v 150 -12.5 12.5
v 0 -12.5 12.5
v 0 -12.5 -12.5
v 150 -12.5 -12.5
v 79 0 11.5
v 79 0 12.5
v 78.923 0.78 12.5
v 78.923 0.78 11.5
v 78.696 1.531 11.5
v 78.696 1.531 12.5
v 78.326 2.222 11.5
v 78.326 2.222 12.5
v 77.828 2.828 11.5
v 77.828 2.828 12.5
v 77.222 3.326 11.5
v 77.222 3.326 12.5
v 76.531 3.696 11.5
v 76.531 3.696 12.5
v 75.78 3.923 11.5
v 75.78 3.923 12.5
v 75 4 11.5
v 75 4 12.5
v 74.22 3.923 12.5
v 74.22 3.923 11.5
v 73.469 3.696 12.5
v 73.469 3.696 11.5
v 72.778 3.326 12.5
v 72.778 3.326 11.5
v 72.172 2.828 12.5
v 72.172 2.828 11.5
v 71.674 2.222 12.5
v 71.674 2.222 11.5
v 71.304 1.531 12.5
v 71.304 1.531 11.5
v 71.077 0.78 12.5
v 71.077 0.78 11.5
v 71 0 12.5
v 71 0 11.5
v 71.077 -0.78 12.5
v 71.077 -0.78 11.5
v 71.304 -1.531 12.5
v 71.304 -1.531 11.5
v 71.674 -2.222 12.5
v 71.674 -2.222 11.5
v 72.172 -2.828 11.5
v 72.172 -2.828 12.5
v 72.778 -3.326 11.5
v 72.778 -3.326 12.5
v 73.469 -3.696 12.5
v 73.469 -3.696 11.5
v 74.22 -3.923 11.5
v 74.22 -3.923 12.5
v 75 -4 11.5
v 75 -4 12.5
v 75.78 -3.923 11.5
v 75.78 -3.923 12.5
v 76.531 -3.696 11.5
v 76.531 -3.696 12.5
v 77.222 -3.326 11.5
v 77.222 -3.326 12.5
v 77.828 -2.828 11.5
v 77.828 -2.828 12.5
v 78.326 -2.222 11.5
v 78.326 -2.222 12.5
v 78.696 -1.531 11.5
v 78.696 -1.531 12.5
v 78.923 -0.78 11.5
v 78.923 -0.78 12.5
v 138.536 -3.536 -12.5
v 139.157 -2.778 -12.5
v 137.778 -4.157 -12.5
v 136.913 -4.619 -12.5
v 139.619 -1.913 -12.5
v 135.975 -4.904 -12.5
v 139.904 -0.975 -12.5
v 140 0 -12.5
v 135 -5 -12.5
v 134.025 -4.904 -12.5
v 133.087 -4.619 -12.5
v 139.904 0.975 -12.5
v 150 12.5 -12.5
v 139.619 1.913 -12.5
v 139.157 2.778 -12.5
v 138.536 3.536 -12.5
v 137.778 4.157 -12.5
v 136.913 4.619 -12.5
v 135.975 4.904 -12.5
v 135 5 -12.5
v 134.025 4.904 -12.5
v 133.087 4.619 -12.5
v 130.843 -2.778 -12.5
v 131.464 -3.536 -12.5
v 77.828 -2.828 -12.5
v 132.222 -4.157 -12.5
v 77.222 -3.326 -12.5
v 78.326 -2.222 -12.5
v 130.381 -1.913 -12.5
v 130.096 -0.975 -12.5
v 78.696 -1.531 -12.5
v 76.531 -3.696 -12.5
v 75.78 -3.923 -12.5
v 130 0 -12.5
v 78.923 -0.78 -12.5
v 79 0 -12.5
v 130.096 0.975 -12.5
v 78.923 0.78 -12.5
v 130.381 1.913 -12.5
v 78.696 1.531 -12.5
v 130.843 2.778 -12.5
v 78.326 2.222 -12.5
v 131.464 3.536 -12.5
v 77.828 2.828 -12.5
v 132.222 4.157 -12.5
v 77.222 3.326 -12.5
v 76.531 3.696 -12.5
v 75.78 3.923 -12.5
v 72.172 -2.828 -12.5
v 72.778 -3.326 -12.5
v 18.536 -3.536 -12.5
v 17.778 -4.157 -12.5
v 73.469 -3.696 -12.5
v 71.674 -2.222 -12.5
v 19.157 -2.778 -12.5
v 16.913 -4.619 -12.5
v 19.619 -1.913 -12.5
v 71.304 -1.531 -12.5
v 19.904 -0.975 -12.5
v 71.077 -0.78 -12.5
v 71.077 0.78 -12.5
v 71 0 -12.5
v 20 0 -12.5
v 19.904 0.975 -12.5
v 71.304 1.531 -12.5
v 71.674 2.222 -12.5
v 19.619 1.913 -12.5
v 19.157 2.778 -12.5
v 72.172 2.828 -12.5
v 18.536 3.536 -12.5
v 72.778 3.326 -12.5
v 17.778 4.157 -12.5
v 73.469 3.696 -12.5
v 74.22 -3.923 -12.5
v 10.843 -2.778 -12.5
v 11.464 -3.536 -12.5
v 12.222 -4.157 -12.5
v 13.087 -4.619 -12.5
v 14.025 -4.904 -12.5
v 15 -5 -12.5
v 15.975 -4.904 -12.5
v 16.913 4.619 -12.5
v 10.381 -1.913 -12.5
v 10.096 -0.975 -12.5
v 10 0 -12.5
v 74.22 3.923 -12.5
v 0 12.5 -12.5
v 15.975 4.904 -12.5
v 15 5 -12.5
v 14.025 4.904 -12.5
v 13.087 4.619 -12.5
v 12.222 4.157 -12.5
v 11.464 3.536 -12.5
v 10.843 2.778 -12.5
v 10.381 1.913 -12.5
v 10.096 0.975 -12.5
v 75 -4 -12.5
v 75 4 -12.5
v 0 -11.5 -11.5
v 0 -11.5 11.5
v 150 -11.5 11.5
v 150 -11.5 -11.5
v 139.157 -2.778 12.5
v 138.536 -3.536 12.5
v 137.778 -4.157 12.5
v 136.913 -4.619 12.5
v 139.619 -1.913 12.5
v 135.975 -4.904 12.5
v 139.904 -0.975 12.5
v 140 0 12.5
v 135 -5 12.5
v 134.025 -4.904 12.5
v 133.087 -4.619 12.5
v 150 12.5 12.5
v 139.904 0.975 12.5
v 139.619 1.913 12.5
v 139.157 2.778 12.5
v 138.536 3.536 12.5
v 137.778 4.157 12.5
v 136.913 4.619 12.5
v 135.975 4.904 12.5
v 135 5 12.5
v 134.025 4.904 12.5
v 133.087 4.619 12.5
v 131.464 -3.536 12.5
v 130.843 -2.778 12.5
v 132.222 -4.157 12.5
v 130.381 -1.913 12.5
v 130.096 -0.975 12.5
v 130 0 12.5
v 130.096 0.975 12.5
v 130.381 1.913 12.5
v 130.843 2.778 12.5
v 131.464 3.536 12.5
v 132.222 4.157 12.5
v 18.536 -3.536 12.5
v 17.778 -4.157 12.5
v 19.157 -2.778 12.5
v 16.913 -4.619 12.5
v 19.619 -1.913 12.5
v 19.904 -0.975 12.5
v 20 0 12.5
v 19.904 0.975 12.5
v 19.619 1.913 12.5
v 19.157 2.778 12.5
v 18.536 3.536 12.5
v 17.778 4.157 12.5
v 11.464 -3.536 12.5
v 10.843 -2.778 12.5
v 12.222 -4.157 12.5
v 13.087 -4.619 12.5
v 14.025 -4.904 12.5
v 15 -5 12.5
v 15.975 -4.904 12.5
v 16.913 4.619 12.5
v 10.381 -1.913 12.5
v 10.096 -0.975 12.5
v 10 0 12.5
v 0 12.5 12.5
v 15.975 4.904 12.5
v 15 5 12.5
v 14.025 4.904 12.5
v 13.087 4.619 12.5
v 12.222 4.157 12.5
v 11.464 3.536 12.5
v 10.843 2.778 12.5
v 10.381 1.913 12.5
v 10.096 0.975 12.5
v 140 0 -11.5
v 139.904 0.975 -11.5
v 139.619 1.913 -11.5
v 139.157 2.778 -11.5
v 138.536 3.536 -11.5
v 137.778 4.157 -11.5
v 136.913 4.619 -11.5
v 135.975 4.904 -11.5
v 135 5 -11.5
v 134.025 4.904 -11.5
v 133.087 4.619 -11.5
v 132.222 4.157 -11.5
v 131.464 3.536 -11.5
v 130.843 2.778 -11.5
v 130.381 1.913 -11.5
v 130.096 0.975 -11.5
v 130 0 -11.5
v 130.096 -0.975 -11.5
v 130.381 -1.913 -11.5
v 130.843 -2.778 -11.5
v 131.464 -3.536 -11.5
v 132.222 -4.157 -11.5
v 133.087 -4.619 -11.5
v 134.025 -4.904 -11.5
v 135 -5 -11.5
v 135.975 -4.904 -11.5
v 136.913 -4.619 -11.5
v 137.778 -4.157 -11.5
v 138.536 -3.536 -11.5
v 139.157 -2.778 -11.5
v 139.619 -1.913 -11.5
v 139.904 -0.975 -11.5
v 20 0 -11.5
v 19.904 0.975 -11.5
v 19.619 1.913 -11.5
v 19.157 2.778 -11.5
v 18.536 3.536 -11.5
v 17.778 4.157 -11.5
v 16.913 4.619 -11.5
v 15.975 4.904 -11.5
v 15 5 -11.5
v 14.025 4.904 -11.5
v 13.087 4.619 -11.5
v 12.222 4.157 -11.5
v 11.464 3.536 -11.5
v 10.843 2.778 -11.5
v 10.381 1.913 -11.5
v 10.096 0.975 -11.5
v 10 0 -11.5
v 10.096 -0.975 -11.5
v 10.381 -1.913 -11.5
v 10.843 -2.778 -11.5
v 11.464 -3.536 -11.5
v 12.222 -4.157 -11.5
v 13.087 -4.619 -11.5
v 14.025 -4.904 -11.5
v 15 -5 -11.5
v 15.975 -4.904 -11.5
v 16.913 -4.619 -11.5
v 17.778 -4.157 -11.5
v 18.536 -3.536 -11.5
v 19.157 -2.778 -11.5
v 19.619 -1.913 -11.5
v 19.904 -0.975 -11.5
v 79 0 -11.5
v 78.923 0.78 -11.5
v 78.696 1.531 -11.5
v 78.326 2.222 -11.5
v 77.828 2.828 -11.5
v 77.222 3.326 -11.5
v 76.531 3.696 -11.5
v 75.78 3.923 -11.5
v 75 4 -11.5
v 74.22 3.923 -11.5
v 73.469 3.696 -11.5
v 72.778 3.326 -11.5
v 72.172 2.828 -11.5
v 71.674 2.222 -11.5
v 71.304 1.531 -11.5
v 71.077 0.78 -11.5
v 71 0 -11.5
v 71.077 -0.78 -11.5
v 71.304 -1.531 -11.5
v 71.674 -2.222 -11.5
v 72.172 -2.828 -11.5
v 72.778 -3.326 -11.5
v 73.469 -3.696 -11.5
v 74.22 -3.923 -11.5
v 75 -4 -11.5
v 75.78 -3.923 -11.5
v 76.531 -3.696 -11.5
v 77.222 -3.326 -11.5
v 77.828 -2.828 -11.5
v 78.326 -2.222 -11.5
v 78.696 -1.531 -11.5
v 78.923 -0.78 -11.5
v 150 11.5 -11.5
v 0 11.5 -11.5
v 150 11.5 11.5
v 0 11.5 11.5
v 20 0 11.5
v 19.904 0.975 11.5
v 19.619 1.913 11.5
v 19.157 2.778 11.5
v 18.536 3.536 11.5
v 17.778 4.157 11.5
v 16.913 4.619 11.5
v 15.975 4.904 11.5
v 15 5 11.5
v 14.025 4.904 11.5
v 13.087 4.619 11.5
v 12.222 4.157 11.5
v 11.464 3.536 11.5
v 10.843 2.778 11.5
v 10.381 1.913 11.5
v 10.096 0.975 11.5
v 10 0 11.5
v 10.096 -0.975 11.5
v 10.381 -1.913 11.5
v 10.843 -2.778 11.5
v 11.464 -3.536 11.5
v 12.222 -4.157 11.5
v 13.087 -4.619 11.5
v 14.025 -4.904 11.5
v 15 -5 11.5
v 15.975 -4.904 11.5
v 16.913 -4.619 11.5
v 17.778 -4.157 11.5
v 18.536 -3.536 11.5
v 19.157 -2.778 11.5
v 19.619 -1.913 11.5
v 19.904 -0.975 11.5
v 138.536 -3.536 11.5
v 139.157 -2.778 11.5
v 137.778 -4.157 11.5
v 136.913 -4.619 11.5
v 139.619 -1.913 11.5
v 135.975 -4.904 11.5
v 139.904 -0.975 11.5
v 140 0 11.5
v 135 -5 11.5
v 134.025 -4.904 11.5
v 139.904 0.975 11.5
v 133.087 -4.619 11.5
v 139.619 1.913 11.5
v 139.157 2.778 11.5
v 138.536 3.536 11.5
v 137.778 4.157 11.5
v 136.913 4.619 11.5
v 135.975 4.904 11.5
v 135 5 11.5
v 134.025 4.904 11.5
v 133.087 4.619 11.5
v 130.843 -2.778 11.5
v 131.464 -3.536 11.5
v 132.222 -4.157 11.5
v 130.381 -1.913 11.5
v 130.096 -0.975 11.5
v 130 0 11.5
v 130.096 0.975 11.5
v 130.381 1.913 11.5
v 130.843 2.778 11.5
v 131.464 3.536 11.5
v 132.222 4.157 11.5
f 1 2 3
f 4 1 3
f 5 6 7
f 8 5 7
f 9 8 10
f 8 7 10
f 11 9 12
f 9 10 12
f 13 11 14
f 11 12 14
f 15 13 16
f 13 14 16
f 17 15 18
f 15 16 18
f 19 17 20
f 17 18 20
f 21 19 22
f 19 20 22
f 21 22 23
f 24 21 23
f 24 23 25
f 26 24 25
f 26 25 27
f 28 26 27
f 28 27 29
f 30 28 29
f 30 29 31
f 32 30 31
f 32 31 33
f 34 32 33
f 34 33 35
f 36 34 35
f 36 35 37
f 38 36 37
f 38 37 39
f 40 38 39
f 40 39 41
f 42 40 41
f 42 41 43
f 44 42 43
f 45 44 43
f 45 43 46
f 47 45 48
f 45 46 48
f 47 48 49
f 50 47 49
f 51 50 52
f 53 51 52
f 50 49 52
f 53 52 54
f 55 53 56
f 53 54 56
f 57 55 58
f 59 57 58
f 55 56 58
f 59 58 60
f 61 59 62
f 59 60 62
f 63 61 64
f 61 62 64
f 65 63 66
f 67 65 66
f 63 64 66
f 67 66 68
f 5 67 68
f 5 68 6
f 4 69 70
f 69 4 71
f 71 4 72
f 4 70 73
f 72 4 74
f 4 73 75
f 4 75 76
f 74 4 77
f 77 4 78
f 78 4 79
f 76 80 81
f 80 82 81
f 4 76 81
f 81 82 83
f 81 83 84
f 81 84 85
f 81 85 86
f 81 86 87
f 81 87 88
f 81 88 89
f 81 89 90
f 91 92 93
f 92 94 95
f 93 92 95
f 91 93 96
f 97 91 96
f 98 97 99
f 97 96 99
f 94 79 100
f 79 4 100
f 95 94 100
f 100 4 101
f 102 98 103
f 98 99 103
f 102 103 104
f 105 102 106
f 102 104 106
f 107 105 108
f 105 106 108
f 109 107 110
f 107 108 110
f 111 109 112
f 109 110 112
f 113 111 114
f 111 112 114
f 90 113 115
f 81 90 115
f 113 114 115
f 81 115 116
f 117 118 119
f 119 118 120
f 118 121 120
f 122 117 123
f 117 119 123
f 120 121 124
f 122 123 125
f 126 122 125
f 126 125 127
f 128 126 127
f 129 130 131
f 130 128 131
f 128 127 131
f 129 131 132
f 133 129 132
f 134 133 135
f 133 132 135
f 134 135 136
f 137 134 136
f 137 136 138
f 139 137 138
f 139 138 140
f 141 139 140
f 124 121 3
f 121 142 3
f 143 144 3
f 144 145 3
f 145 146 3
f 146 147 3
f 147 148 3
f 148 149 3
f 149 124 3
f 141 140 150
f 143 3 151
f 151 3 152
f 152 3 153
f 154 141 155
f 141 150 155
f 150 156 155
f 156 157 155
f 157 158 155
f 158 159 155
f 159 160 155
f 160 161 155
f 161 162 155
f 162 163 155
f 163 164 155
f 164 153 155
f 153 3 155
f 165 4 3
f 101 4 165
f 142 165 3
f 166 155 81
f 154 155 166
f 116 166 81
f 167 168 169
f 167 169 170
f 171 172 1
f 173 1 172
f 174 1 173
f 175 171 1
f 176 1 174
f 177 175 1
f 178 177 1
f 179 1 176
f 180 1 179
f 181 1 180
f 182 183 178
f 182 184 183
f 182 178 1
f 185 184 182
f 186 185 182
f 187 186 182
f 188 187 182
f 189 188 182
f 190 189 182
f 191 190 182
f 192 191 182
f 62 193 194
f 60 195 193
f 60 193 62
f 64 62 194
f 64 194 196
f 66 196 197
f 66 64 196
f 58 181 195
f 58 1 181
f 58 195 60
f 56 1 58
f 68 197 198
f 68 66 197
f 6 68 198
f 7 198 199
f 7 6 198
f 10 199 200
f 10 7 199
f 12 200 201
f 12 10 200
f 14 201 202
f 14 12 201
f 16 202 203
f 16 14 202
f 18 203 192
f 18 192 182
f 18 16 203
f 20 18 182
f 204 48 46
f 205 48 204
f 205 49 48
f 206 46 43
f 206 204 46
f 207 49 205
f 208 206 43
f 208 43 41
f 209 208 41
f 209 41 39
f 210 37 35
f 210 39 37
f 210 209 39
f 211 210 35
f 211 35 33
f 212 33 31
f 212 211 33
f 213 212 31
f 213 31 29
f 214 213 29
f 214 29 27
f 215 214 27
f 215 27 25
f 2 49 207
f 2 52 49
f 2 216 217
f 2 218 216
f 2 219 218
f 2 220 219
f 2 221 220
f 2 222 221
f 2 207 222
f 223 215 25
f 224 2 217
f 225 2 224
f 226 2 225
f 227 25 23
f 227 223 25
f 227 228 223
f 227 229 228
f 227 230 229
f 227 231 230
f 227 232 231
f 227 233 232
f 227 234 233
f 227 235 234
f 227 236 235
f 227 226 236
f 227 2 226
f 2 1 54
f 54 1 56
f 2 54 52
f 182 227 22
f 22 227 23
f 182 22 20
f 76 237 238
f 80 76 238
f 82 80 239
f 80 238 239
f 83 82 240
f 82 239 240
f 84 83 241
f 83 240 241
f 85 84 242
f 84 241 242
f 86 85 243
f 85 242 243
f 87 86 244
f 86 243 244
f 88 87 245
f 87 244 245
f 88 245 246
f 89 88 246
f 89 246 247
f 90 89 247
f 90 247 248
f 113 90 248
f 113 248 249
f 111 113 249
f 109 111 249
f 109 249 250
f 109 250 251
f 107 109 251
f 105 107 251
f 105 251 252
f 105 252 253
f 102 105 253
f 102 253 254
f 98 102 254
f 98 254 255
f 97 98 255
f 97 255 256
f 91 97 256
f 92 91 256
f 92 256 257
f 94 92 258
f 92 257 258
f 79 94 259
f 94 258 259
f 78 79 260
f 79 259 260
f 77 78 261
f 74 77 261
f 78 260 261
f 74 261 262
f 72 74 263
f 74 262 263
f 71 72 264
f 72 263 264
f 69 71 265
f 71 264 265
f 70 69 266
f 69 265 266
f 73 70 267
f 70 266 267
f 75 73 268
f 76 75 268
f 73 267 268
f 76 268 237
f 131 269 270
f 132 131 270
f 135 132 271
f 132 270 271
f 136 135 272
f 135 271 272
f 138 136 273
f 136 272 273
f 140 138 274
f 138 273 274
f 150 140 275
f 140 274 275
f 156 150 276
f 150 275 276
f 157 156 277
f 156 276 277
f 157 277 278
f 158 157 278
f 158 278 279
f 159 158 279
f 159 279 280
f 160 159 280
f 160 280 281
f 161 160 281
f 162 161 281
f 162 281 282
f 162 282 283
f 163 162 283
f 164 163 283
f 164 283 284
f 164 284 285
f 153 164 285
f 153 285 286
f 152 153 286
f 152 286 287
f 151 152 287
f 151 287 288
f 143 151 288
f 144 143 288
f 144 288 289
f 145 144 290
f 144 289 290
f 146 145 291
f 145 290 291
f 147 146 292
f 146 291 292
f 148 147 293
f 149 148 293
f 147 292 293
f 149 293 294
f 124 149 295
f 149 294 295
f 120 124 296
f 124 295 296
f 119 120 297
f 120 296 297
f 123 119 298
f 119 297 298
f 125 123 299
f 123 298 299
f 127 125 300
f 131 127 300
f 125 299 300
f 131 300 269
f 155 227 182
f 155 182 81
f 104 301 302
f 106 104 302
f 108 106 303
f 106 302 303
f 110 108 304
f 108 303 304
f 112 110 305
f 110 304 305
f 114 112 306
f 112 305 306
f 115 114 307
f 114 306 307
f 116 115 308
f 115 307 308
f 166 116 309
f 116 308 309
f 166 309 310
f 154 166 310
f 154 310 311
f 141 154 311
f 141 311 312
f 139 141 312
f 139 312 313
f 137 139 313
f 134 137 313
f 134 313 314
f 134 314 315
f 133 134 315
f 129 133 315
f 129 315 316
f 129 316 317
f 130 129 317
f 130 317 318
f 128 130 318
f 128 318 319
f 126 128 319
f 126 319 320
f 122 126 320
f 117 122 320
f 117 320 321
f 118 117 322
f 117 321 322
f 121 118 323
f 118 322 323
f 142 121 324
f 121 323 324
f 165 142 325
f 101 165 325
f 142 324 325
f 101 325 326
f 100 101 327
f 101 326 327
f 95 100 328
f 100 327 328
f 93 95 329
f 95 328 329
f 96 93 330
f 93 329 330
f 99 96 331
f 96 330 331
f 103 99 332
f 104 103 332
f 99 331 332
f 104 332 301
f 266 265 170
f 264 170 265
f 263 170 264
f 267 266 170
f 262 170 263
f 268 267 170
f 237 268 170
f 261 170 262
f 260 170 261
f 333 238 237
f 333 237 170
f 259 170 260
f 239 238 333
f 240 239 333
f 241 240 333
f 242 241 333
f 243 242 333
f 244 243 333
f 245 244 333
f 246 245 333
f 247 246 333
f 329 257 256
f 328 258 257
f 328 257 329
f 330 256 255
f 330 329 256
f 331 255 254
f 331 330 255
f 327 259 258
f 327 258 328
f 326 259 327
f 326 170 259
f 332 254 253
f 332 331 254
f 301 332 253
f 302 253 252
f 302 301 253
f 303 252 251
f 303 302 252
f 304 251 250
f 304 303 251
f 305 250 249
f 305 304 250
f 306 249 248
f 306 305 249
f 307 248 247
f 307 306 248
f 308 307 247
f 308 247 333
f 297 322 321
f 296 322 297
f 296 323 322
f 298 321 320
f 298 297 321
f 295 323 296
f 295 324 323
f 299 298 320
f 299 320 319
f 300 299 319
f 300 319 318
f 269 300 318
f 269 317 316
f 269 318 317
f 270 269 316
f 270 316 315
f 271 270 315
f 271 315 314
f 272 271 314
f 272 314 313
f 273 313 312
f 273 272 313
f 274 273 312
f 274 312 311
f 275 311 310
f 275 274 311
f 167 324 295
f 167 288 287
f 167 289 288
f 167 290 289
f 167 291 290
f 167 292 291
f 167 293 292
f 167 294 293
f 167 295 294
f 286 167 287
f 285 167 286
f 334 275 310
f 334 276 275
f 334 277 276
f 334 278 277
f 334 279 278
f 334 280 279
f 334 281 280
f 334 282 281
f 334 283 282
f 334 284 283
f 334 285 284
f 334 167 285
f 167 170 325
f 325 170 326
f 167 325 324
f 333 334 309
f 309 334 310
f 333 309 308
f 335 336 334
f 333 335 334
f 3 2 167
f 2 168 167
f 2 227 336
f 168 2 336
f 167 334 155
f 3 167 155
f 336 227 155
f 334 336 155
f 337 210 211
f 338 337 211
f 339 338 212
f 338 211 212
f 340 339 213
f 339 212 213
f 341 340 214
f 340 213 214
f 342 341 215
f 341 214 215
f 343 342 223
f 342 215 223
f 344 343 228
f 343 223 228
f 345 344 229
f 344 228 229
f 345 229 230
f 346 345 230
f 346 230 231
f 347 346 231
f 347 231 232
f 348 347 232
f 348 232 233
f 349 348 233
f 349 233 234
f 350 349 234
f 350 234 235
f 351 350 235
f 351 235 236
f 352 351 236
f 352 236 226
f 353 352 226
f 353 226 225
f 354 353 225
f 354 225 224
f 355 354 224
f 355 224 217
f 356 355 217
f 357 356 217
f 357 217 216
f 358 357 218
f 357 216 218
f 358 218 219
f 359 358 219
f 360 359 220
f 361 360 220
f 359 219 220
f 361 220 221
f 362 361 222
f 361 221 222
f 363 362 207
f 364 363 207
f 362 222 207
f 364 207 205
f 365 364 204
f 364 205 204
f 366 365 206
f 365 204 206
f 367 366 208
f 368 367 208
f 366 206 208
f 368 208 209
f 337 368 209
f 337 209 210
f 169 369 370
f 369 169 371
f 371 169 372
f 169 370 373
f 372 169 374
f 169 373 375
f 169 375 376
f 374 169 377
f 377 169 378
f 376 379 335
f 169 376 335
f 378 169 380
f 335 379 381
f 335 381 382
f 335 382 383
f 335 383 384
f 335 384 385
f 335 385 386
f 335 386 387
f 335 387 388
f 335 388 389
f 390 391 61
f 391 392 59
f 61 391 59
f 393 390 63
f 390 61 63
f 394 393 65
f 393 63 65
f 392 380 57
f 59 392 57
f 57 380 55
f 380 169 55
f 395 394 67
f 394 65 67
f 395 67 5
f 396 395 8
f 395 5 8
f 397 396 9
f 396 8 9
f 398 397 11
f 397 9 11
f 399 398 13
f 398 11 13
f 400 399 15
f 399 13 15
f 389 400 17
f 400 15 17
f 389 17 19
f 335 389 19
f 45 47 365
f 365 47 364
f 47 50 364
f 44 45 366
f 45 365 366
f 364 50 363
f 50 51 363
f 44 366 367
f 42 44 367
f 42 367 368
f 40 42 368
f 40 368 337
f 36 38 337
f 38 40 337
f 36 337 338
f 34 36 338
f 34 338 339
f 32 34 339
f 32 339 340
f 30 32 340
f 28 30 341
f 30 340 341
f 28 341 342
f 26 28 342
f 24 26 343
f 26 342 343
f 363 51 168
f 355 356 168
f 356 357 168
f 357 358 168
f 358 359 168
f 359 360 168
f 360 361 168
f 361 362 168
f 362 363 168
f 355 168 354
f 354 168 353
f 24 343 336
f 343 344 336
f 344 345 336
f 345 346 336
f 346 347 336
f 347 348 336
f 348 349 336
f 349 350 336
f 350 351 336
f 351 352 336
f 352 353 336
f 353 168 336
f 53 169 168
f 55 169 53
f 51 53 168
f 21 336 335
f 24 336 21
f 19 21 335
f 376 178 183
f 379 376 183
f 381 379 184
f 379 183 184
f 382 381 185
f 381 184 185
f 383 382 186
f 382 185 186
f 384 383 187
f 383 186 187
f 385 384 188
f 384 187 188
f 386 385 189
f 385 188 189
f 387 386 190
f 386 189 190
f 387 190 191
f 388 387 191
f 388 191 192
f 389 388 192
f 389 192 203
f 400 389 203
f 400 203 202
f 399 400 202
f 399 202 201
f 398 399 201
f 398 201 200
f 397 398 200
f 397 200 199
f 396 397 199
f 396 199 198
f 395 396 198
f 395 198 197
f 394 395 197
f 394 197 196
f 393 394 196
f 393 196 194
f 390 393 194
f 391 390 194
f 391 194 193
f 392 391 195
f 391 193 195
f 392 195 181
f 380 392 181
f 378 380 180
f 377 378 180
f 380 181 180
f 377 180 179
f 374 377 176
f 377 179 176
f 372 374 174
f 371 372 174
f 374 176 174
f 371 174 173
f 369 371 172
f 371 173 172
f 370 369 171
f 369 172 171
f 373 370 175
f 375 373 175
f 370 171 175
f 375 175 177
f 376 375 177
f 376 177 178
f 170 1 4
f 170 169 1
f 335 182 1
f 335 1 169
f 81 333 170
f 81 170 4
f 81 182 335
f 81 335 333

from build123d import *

# Parameters (mm, degrees)
SKETCH1_W           = 25
SKETCH1_H           = 25
SKETCH1_W_2         = 23
SKETCH1_H_2         = 23
BOSS_EXTRUDE1_DEPTH = 150
SKETCH2_R           = 4
SKETCH2_R_2         = 5
CUT_EXTRUDE1_DEPTH  = 153.581945197


with BuildPart() as part:
    # Sketch1 → Boss-Extrude1 (new body)
    with BuildSketch(Plane(origin=(0, 0, 0), x_dir=(0, 0, -1), z_dir=(1, 0, 0))):
        Rectangle(SKETCH1_W, SKETCH1_H)
        Rectangle(SKETCH1_W_2, SKETCH1_H_2, mode=Mode.SUBTRACT)
    extrude(amount=BOSS_EXTRUDE1_DEPTH)

    # Sketch2 → Cut-Extrude1 (cut, through all)
    with BuildSketch(Plane.XY.offset(12.5)):
        with Locations((75, 0)):
            Circle(SKETCH2_R)
        with Locations((15, 0)):
            Circle(SKETCH2_R_2)
        with Locations((135, 0)):
            Circle(SKETCH2_R_2)
    extrude(amount=-CUT_EXTRUDE1_DEPTH, mode=Mode.SUBTRACT)


solid = part.part
